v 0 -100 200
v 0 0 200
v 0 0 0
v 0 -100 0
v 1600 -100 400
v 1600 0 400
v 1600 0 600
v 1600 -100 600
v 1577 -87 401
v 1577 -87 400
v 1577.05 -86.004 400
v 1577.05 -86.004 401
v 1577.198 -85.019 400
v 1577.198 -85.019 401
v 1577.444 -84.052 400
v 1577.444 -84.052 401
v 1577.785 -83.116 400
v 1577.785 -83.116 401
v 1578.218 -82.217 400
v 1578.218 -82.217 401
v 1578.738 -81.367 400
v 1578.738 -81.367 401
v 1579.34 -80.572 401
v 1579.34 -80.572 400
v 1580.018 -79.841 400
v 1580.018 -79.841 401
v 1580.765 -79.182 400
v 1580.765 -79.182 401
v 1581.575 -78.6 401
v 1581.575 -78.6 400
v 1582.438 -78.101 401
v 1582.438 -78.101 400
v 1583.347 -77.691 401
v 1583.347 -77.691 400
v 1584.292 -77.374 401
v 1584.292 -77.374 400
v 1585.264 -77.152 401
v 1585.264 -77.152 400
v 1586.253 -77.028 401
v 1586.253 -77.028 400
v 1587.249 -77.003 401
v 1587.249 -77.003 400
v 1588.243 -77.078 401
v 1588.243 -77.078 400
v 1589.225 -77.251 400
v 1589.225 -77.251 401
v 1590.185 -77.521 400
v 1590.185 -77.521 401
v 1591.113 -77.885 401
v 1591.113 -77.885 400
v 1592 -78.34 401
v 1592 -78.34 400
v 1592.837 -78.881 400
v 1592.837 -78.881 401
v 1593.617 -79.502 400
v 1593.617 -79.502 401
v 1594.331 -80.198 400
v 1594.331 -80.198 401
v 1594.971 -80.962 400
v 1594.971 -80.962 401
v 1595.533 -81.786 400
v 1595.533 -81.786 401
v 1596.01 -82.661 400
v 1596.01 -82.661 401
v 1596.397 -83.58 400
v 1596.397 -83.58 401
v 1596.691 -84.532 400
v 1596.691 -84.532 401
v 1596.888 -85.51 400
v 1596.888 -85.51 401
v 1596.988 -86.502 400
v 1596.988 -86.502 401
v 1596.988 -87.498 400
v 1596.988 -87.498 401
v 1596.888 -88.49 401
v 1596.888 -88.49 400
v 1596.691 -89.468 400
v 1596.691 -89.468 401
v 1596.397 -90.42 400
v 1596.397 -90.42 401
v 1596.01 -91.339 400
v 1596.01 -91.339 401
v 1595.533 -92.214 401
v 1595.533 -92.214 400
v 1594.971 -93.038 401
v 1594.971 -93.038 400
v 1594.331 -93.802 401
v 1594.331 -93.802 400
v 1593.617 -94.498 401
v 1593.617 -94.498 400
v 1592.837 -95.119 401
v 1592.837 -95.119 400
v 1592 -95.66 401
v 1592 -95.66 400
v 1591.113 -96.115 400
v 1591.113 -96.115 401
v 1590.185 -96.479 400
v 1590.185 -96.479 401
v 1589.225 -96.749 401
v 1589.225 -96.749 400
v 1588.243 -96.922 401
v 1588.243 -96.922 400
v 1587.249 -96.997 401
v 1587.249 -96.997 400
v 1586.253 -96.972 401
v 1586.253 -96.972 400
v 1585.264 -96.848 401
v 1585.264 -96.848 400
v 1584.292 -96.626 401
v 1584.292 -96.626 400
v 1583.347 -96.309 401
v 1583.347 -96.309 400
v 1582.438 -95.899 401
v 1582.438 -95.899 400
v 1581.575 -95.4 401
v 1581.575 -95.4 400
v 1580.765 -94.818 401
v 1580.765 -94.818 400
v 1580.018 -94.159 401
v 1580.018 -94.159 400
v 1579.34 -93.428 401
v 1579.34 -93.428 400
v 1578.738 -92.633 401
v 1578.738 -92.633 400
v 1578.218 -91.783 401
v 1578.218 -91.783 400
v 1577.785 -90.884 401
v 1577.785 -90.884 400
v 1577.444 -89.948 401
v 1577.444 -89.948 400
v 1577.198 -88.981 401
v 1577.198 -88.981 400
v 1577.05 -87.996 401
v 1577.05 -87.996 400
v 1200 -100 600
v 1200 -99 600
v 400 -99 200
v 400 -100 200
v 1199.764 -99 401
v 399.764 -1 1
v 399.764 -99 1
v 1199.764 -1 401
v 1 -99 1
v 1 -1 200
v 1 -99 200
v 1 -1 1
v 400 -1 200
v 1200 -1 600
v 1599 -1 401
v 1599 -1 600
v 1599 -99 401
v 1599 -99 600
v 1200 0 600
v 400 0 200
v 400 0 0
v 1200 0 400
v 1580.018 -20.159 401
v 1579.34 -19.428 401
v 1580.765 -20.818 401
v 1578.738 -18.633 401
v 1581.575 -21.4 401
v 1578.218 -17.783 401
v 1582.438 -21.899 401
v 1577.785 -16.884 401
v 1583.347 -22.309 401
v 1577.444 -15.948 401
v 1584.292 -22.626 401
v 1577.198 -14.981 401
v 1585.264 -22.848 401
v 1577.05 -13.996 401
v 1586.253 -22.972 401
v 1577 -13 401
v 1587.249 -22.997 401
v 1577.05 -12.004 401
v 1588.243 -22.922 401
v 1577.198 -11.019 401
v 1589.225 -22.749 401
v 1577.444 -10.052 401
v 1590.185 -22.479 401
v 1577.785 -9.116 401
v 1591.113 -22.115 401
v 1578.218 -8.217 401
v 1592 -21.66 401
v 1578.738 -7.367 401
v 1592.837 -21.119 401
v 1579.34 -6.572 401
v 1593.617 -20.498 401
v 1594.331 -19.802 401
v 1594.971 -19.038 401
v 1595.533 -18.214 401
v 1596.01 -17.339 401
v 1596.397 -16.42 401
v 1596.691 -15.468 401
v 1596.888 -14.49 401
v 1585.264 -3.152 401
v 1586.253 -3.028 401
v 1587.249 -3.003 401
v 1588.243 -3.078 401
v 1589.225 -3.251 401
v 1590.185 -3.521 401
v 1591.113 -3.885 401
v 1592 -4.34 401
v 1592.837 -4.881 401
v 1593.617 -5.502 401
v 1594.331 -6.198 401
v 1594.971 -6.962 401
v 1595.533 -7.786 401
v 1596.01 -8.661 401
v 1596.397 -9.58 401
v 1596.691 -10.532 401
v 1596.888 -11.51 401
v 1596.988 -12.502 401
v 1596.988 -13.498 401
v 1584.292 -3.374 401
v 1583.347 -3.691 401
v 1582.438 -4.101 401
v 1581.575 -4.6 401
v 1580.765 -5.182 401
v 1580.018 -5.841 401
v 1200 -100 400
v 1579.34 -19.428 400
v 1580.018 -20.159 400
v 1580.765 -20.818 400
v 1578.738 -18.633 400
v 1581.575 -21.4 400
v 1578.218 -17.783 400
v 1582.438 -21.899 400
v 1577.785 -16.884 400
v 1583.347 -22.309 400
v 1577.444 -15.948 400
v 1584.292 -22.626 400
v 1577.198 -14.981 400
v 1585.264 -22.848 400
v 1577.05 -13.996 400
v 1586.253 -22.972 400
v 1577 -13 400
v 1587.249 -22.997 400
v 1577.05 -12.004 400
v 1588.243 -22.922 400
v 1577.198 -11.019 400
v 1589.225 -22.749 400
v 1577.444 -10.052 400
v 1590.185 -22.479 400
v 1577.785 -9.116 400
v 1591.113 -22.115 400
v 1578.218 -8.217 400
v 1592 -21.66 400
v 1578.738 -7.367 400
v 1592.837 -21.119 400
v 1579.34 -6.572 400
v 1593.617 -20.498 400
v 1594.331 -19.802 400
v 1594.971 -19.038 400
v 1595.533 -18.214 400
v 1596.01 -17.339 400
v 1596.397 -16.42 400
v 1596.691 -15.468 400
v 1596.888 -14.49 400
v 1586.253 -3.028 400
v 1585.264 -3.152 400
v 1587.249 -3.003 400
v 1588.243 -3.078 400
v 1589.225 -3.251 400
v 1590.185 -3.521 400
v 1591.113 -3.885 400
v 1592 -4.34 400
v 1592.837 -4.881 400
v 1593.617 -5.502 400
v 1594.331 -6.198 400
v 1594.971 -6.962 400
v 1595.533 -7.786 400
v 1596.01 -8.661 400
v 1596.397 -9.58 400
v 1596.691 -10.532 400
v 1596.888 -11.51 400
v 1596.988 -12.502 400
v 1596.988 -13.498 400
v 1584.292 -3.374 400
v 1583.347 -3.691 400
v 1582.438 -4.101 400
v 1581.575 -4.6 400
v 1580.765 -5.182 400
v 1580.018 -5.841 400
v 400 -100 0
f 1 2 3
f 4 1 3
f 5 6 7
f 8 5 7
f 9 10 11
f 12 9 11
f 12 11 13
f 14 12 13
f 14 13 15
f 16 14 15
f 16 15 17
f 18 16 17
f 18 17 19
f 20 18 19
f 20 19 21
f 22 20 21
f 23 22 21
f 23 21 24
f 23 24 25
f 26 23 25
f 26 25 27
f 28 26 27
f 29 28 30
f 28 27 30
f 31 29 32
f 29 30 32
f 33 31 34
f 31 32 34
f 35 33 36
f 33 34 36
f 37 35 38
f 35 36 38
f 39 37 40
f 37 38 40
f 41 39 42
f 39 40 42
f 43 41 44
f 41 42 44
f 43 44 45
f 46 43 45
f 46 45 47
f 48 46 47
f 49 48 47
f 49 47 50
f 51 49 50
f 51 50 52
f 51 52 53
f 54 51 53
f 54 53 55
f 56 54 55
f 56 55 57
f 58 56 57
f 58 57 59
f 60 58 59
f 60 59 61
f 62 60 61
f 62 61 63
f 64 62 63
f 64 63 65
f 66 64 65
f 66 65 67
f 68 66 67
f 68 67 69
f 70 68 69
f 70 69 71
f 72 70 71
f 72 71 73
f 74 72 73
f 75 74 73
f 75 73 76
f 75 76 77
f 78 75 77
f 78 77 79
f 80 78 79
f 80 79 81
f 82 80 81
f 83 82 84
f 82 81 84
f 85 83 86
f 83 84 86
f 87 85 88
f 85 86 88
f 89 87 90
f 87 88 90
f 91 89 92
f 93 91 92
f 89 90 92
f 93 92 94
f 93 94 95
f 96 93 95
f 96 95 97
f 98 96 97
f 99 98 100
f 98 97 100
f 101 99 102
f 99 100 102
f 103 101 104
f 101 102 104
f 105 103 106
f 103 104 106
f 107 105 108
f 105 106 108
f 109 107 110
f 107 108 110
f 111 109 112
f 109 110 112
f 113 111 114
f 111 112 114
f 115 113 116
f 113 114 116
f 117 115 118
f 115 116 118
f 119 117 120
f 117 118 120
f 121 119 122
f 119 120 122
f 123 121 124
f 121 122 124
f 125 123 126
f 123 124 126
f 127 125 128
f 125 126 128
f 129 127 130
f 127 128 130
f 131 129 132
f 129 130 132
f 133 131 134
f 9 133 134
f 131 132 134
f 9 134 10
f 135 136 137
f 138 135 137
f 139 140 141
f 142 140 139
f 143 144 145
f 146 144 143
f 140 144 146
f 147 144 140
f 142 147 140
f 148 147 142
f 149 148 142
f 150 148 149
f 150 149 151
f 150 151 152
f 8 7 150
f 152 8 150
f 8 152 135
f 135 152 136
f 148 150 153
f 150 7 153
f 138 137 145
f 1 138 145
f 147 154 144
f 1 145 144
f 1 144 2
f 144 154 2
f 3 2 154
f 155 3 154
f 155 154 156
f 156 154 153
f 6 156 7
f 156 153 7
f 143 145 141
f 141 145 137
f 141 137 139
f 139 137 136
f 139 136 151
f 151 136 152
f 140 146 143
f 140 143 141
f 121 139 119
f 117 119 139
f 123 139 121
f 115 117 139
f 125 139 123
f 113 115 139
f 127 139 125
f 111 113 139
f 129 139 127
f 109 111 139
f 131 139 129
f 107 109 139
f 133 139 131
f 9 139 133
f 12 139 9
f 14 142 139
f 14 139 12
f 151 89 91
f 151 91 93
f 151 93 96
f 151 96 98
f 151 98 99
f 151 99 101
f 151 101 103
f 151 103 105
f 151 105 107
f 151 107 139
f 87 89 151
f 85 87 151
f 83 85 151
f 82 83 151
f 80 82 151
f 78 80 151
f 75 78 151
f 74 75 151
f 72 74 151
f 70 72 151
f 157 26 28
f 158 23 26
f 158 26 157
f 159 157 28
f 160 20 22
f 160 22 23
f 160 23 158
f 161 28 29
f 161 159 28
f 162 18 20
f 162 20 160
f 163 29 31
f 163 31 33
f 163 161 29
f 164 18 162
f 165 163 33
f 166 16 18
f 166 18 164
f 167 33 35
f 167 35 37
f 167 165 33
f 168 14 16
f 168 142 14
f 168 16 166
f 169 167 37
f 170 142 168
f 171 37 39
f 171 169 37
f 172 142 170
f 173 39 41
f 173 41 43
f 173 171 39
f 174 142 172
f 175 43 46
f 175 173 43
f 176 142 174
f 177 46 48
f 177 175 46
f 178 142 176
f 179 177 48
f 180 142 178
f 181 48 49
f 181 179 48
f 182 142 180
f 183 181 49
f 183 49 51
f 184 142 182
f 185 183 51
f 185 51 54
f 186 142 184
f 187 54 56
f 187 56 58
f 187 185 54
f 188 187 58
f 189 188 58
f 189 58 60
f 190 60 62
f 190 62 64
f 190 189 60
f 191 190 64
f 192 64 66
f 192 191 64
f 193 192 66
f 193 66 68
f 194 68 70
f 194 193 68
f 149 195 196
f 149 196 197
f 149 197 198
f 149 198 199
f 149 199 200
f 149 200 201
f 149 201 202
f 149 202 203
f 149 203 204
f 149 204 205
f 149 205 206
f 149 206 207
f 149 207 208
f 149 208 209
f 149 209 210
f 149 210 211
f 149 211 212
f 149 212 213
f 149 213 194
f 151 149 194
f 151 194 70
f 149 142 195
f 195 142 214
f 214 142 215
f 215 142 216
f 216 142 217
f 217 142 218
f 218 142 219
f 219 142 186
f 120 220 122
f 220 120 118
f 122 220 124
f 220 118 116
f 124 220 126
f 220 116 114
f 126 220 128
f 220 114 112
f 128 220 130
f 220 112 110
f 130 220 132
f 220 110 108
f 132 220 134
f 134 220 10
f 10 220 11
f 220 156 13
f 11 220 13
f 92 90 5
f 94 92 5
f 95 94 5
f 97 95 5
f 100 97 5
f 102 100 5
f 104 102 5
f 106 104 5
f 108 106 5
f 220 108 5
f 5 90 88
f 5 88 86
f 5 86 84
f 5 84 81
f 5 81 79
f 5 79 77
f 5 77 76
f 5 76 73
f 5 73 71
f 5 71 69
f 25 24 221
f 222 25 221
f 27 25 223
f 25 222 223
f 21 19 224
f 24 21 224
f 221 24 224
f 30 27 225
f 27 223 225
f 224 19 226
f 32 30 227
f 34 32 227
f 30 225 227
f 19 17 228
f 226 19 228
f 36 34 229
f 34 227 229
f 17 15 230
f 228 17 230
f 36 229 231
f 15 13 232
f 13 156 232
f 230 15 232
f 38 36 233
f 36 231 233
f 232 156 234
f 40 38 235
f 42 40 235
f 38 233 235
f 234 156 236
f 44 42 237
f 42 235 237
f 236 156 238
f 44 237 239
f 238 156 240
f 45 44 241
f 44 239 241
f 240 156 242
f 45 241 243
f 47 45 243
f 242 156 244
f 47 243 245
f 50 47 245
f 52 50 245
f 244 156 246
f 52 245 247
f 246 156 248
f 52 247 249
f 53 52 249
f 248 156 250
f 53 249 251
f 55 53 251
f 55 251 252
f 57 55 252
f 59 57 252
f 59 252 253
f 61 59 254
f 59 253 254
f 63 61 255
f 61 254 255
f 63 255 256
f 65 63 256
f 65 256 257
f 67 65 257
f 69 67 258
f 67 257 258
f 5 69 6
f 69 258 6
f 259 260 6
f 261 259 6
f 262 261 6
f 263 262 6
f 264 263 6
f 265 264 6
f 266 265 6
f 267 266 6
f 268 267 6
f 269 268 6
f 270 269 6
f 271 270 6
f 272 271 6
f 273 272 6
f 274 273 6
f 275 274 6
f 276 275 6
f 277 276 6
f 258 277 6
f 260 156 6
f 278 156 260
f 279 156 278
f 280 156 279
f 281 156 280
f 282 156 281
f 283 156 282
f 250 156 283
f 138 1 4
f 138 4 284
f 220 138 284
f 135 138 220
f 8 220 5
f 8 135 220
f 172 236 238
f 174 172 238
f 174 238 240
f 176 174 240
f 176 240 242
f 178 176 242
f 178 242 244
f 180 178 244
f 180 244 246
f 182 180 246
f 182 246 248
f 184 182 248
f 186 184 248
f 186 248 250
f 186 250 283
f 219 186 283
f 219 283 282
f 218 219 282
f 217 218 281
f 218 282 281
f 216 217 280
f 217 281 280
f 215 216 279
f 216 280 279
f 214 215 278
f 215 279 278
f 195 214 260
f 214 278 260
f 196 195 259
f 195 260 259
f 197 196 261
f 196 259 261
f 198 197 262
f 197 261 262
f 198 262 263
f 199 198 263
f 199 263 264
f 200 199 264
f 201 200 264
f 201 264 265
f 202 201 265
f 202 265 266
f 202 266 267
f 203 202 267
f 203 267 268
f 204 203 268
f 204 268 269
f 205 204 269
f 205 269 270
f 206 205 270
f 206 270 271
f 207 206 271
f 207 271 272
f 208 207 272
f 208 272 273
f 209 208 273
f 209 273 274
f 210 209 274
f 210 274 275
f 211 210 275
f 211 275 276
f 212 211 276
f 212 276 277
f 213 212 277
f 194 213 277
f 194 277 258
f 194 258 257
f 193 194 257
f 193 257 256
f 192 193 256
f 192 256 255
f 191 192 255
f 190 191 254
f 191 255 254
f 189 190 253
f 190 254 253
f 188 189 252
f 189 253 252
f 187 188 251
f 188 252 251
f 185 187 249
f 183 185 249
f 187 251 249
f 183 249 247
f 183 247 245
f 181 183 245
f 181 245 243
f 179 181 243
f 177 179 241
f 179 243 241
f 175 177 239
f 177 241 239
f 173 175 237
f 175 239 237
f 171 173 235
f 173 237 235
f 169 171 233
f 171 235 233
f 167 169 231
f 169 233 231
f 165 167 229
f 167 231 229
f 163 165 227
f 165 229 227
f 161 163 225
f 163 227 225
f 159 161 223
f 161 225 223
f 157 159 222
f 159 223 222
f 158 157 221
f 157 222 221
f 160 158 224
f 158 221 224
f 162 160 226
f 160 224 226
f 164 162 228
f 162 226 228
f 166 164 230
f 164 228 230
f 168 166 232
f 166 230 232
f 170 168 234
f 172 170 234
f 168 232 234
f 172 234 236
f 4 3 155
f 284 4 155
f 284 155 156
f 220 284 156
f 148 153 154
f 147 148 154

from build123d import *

# Parameters (mm, degrees)
F1_DEPTH = 100
F2_T     = -1
F5_D     = 20


# Not quite as in the source:
# - the program builds the solid bodies; features that only make, move or delete a surface that nothing else refers to are left out


with BuildPart() as f1:
    # F0 (on Front) → F1 (new body)
    with BuildSketch(Plane.XZ):
        Polygon((0, 200), (0, 0), (400, 0), (1200, 400), (1600, 400), (1600, 600), (1200, 600), (400, 200), align=None)
    extrude(amount=F1_DEPTH)

    # F2
    f2_openings = [f1.faces().sort_by_distance(p)[0] for p in [
        (200, -50, 200),
        (800, -50, 400),
        (1400, -50, 600),
    ]]
    offset(amount=F2_T, openings=f2_openings, kind=Kind.INTERSECTION)

    # F5 (through all)
    with Locations(Plane.XY.offset(401)):
        with Locations((1587, -13), (1587, -87)):
            Hole(F5_D / 2)


solid = f1.part
